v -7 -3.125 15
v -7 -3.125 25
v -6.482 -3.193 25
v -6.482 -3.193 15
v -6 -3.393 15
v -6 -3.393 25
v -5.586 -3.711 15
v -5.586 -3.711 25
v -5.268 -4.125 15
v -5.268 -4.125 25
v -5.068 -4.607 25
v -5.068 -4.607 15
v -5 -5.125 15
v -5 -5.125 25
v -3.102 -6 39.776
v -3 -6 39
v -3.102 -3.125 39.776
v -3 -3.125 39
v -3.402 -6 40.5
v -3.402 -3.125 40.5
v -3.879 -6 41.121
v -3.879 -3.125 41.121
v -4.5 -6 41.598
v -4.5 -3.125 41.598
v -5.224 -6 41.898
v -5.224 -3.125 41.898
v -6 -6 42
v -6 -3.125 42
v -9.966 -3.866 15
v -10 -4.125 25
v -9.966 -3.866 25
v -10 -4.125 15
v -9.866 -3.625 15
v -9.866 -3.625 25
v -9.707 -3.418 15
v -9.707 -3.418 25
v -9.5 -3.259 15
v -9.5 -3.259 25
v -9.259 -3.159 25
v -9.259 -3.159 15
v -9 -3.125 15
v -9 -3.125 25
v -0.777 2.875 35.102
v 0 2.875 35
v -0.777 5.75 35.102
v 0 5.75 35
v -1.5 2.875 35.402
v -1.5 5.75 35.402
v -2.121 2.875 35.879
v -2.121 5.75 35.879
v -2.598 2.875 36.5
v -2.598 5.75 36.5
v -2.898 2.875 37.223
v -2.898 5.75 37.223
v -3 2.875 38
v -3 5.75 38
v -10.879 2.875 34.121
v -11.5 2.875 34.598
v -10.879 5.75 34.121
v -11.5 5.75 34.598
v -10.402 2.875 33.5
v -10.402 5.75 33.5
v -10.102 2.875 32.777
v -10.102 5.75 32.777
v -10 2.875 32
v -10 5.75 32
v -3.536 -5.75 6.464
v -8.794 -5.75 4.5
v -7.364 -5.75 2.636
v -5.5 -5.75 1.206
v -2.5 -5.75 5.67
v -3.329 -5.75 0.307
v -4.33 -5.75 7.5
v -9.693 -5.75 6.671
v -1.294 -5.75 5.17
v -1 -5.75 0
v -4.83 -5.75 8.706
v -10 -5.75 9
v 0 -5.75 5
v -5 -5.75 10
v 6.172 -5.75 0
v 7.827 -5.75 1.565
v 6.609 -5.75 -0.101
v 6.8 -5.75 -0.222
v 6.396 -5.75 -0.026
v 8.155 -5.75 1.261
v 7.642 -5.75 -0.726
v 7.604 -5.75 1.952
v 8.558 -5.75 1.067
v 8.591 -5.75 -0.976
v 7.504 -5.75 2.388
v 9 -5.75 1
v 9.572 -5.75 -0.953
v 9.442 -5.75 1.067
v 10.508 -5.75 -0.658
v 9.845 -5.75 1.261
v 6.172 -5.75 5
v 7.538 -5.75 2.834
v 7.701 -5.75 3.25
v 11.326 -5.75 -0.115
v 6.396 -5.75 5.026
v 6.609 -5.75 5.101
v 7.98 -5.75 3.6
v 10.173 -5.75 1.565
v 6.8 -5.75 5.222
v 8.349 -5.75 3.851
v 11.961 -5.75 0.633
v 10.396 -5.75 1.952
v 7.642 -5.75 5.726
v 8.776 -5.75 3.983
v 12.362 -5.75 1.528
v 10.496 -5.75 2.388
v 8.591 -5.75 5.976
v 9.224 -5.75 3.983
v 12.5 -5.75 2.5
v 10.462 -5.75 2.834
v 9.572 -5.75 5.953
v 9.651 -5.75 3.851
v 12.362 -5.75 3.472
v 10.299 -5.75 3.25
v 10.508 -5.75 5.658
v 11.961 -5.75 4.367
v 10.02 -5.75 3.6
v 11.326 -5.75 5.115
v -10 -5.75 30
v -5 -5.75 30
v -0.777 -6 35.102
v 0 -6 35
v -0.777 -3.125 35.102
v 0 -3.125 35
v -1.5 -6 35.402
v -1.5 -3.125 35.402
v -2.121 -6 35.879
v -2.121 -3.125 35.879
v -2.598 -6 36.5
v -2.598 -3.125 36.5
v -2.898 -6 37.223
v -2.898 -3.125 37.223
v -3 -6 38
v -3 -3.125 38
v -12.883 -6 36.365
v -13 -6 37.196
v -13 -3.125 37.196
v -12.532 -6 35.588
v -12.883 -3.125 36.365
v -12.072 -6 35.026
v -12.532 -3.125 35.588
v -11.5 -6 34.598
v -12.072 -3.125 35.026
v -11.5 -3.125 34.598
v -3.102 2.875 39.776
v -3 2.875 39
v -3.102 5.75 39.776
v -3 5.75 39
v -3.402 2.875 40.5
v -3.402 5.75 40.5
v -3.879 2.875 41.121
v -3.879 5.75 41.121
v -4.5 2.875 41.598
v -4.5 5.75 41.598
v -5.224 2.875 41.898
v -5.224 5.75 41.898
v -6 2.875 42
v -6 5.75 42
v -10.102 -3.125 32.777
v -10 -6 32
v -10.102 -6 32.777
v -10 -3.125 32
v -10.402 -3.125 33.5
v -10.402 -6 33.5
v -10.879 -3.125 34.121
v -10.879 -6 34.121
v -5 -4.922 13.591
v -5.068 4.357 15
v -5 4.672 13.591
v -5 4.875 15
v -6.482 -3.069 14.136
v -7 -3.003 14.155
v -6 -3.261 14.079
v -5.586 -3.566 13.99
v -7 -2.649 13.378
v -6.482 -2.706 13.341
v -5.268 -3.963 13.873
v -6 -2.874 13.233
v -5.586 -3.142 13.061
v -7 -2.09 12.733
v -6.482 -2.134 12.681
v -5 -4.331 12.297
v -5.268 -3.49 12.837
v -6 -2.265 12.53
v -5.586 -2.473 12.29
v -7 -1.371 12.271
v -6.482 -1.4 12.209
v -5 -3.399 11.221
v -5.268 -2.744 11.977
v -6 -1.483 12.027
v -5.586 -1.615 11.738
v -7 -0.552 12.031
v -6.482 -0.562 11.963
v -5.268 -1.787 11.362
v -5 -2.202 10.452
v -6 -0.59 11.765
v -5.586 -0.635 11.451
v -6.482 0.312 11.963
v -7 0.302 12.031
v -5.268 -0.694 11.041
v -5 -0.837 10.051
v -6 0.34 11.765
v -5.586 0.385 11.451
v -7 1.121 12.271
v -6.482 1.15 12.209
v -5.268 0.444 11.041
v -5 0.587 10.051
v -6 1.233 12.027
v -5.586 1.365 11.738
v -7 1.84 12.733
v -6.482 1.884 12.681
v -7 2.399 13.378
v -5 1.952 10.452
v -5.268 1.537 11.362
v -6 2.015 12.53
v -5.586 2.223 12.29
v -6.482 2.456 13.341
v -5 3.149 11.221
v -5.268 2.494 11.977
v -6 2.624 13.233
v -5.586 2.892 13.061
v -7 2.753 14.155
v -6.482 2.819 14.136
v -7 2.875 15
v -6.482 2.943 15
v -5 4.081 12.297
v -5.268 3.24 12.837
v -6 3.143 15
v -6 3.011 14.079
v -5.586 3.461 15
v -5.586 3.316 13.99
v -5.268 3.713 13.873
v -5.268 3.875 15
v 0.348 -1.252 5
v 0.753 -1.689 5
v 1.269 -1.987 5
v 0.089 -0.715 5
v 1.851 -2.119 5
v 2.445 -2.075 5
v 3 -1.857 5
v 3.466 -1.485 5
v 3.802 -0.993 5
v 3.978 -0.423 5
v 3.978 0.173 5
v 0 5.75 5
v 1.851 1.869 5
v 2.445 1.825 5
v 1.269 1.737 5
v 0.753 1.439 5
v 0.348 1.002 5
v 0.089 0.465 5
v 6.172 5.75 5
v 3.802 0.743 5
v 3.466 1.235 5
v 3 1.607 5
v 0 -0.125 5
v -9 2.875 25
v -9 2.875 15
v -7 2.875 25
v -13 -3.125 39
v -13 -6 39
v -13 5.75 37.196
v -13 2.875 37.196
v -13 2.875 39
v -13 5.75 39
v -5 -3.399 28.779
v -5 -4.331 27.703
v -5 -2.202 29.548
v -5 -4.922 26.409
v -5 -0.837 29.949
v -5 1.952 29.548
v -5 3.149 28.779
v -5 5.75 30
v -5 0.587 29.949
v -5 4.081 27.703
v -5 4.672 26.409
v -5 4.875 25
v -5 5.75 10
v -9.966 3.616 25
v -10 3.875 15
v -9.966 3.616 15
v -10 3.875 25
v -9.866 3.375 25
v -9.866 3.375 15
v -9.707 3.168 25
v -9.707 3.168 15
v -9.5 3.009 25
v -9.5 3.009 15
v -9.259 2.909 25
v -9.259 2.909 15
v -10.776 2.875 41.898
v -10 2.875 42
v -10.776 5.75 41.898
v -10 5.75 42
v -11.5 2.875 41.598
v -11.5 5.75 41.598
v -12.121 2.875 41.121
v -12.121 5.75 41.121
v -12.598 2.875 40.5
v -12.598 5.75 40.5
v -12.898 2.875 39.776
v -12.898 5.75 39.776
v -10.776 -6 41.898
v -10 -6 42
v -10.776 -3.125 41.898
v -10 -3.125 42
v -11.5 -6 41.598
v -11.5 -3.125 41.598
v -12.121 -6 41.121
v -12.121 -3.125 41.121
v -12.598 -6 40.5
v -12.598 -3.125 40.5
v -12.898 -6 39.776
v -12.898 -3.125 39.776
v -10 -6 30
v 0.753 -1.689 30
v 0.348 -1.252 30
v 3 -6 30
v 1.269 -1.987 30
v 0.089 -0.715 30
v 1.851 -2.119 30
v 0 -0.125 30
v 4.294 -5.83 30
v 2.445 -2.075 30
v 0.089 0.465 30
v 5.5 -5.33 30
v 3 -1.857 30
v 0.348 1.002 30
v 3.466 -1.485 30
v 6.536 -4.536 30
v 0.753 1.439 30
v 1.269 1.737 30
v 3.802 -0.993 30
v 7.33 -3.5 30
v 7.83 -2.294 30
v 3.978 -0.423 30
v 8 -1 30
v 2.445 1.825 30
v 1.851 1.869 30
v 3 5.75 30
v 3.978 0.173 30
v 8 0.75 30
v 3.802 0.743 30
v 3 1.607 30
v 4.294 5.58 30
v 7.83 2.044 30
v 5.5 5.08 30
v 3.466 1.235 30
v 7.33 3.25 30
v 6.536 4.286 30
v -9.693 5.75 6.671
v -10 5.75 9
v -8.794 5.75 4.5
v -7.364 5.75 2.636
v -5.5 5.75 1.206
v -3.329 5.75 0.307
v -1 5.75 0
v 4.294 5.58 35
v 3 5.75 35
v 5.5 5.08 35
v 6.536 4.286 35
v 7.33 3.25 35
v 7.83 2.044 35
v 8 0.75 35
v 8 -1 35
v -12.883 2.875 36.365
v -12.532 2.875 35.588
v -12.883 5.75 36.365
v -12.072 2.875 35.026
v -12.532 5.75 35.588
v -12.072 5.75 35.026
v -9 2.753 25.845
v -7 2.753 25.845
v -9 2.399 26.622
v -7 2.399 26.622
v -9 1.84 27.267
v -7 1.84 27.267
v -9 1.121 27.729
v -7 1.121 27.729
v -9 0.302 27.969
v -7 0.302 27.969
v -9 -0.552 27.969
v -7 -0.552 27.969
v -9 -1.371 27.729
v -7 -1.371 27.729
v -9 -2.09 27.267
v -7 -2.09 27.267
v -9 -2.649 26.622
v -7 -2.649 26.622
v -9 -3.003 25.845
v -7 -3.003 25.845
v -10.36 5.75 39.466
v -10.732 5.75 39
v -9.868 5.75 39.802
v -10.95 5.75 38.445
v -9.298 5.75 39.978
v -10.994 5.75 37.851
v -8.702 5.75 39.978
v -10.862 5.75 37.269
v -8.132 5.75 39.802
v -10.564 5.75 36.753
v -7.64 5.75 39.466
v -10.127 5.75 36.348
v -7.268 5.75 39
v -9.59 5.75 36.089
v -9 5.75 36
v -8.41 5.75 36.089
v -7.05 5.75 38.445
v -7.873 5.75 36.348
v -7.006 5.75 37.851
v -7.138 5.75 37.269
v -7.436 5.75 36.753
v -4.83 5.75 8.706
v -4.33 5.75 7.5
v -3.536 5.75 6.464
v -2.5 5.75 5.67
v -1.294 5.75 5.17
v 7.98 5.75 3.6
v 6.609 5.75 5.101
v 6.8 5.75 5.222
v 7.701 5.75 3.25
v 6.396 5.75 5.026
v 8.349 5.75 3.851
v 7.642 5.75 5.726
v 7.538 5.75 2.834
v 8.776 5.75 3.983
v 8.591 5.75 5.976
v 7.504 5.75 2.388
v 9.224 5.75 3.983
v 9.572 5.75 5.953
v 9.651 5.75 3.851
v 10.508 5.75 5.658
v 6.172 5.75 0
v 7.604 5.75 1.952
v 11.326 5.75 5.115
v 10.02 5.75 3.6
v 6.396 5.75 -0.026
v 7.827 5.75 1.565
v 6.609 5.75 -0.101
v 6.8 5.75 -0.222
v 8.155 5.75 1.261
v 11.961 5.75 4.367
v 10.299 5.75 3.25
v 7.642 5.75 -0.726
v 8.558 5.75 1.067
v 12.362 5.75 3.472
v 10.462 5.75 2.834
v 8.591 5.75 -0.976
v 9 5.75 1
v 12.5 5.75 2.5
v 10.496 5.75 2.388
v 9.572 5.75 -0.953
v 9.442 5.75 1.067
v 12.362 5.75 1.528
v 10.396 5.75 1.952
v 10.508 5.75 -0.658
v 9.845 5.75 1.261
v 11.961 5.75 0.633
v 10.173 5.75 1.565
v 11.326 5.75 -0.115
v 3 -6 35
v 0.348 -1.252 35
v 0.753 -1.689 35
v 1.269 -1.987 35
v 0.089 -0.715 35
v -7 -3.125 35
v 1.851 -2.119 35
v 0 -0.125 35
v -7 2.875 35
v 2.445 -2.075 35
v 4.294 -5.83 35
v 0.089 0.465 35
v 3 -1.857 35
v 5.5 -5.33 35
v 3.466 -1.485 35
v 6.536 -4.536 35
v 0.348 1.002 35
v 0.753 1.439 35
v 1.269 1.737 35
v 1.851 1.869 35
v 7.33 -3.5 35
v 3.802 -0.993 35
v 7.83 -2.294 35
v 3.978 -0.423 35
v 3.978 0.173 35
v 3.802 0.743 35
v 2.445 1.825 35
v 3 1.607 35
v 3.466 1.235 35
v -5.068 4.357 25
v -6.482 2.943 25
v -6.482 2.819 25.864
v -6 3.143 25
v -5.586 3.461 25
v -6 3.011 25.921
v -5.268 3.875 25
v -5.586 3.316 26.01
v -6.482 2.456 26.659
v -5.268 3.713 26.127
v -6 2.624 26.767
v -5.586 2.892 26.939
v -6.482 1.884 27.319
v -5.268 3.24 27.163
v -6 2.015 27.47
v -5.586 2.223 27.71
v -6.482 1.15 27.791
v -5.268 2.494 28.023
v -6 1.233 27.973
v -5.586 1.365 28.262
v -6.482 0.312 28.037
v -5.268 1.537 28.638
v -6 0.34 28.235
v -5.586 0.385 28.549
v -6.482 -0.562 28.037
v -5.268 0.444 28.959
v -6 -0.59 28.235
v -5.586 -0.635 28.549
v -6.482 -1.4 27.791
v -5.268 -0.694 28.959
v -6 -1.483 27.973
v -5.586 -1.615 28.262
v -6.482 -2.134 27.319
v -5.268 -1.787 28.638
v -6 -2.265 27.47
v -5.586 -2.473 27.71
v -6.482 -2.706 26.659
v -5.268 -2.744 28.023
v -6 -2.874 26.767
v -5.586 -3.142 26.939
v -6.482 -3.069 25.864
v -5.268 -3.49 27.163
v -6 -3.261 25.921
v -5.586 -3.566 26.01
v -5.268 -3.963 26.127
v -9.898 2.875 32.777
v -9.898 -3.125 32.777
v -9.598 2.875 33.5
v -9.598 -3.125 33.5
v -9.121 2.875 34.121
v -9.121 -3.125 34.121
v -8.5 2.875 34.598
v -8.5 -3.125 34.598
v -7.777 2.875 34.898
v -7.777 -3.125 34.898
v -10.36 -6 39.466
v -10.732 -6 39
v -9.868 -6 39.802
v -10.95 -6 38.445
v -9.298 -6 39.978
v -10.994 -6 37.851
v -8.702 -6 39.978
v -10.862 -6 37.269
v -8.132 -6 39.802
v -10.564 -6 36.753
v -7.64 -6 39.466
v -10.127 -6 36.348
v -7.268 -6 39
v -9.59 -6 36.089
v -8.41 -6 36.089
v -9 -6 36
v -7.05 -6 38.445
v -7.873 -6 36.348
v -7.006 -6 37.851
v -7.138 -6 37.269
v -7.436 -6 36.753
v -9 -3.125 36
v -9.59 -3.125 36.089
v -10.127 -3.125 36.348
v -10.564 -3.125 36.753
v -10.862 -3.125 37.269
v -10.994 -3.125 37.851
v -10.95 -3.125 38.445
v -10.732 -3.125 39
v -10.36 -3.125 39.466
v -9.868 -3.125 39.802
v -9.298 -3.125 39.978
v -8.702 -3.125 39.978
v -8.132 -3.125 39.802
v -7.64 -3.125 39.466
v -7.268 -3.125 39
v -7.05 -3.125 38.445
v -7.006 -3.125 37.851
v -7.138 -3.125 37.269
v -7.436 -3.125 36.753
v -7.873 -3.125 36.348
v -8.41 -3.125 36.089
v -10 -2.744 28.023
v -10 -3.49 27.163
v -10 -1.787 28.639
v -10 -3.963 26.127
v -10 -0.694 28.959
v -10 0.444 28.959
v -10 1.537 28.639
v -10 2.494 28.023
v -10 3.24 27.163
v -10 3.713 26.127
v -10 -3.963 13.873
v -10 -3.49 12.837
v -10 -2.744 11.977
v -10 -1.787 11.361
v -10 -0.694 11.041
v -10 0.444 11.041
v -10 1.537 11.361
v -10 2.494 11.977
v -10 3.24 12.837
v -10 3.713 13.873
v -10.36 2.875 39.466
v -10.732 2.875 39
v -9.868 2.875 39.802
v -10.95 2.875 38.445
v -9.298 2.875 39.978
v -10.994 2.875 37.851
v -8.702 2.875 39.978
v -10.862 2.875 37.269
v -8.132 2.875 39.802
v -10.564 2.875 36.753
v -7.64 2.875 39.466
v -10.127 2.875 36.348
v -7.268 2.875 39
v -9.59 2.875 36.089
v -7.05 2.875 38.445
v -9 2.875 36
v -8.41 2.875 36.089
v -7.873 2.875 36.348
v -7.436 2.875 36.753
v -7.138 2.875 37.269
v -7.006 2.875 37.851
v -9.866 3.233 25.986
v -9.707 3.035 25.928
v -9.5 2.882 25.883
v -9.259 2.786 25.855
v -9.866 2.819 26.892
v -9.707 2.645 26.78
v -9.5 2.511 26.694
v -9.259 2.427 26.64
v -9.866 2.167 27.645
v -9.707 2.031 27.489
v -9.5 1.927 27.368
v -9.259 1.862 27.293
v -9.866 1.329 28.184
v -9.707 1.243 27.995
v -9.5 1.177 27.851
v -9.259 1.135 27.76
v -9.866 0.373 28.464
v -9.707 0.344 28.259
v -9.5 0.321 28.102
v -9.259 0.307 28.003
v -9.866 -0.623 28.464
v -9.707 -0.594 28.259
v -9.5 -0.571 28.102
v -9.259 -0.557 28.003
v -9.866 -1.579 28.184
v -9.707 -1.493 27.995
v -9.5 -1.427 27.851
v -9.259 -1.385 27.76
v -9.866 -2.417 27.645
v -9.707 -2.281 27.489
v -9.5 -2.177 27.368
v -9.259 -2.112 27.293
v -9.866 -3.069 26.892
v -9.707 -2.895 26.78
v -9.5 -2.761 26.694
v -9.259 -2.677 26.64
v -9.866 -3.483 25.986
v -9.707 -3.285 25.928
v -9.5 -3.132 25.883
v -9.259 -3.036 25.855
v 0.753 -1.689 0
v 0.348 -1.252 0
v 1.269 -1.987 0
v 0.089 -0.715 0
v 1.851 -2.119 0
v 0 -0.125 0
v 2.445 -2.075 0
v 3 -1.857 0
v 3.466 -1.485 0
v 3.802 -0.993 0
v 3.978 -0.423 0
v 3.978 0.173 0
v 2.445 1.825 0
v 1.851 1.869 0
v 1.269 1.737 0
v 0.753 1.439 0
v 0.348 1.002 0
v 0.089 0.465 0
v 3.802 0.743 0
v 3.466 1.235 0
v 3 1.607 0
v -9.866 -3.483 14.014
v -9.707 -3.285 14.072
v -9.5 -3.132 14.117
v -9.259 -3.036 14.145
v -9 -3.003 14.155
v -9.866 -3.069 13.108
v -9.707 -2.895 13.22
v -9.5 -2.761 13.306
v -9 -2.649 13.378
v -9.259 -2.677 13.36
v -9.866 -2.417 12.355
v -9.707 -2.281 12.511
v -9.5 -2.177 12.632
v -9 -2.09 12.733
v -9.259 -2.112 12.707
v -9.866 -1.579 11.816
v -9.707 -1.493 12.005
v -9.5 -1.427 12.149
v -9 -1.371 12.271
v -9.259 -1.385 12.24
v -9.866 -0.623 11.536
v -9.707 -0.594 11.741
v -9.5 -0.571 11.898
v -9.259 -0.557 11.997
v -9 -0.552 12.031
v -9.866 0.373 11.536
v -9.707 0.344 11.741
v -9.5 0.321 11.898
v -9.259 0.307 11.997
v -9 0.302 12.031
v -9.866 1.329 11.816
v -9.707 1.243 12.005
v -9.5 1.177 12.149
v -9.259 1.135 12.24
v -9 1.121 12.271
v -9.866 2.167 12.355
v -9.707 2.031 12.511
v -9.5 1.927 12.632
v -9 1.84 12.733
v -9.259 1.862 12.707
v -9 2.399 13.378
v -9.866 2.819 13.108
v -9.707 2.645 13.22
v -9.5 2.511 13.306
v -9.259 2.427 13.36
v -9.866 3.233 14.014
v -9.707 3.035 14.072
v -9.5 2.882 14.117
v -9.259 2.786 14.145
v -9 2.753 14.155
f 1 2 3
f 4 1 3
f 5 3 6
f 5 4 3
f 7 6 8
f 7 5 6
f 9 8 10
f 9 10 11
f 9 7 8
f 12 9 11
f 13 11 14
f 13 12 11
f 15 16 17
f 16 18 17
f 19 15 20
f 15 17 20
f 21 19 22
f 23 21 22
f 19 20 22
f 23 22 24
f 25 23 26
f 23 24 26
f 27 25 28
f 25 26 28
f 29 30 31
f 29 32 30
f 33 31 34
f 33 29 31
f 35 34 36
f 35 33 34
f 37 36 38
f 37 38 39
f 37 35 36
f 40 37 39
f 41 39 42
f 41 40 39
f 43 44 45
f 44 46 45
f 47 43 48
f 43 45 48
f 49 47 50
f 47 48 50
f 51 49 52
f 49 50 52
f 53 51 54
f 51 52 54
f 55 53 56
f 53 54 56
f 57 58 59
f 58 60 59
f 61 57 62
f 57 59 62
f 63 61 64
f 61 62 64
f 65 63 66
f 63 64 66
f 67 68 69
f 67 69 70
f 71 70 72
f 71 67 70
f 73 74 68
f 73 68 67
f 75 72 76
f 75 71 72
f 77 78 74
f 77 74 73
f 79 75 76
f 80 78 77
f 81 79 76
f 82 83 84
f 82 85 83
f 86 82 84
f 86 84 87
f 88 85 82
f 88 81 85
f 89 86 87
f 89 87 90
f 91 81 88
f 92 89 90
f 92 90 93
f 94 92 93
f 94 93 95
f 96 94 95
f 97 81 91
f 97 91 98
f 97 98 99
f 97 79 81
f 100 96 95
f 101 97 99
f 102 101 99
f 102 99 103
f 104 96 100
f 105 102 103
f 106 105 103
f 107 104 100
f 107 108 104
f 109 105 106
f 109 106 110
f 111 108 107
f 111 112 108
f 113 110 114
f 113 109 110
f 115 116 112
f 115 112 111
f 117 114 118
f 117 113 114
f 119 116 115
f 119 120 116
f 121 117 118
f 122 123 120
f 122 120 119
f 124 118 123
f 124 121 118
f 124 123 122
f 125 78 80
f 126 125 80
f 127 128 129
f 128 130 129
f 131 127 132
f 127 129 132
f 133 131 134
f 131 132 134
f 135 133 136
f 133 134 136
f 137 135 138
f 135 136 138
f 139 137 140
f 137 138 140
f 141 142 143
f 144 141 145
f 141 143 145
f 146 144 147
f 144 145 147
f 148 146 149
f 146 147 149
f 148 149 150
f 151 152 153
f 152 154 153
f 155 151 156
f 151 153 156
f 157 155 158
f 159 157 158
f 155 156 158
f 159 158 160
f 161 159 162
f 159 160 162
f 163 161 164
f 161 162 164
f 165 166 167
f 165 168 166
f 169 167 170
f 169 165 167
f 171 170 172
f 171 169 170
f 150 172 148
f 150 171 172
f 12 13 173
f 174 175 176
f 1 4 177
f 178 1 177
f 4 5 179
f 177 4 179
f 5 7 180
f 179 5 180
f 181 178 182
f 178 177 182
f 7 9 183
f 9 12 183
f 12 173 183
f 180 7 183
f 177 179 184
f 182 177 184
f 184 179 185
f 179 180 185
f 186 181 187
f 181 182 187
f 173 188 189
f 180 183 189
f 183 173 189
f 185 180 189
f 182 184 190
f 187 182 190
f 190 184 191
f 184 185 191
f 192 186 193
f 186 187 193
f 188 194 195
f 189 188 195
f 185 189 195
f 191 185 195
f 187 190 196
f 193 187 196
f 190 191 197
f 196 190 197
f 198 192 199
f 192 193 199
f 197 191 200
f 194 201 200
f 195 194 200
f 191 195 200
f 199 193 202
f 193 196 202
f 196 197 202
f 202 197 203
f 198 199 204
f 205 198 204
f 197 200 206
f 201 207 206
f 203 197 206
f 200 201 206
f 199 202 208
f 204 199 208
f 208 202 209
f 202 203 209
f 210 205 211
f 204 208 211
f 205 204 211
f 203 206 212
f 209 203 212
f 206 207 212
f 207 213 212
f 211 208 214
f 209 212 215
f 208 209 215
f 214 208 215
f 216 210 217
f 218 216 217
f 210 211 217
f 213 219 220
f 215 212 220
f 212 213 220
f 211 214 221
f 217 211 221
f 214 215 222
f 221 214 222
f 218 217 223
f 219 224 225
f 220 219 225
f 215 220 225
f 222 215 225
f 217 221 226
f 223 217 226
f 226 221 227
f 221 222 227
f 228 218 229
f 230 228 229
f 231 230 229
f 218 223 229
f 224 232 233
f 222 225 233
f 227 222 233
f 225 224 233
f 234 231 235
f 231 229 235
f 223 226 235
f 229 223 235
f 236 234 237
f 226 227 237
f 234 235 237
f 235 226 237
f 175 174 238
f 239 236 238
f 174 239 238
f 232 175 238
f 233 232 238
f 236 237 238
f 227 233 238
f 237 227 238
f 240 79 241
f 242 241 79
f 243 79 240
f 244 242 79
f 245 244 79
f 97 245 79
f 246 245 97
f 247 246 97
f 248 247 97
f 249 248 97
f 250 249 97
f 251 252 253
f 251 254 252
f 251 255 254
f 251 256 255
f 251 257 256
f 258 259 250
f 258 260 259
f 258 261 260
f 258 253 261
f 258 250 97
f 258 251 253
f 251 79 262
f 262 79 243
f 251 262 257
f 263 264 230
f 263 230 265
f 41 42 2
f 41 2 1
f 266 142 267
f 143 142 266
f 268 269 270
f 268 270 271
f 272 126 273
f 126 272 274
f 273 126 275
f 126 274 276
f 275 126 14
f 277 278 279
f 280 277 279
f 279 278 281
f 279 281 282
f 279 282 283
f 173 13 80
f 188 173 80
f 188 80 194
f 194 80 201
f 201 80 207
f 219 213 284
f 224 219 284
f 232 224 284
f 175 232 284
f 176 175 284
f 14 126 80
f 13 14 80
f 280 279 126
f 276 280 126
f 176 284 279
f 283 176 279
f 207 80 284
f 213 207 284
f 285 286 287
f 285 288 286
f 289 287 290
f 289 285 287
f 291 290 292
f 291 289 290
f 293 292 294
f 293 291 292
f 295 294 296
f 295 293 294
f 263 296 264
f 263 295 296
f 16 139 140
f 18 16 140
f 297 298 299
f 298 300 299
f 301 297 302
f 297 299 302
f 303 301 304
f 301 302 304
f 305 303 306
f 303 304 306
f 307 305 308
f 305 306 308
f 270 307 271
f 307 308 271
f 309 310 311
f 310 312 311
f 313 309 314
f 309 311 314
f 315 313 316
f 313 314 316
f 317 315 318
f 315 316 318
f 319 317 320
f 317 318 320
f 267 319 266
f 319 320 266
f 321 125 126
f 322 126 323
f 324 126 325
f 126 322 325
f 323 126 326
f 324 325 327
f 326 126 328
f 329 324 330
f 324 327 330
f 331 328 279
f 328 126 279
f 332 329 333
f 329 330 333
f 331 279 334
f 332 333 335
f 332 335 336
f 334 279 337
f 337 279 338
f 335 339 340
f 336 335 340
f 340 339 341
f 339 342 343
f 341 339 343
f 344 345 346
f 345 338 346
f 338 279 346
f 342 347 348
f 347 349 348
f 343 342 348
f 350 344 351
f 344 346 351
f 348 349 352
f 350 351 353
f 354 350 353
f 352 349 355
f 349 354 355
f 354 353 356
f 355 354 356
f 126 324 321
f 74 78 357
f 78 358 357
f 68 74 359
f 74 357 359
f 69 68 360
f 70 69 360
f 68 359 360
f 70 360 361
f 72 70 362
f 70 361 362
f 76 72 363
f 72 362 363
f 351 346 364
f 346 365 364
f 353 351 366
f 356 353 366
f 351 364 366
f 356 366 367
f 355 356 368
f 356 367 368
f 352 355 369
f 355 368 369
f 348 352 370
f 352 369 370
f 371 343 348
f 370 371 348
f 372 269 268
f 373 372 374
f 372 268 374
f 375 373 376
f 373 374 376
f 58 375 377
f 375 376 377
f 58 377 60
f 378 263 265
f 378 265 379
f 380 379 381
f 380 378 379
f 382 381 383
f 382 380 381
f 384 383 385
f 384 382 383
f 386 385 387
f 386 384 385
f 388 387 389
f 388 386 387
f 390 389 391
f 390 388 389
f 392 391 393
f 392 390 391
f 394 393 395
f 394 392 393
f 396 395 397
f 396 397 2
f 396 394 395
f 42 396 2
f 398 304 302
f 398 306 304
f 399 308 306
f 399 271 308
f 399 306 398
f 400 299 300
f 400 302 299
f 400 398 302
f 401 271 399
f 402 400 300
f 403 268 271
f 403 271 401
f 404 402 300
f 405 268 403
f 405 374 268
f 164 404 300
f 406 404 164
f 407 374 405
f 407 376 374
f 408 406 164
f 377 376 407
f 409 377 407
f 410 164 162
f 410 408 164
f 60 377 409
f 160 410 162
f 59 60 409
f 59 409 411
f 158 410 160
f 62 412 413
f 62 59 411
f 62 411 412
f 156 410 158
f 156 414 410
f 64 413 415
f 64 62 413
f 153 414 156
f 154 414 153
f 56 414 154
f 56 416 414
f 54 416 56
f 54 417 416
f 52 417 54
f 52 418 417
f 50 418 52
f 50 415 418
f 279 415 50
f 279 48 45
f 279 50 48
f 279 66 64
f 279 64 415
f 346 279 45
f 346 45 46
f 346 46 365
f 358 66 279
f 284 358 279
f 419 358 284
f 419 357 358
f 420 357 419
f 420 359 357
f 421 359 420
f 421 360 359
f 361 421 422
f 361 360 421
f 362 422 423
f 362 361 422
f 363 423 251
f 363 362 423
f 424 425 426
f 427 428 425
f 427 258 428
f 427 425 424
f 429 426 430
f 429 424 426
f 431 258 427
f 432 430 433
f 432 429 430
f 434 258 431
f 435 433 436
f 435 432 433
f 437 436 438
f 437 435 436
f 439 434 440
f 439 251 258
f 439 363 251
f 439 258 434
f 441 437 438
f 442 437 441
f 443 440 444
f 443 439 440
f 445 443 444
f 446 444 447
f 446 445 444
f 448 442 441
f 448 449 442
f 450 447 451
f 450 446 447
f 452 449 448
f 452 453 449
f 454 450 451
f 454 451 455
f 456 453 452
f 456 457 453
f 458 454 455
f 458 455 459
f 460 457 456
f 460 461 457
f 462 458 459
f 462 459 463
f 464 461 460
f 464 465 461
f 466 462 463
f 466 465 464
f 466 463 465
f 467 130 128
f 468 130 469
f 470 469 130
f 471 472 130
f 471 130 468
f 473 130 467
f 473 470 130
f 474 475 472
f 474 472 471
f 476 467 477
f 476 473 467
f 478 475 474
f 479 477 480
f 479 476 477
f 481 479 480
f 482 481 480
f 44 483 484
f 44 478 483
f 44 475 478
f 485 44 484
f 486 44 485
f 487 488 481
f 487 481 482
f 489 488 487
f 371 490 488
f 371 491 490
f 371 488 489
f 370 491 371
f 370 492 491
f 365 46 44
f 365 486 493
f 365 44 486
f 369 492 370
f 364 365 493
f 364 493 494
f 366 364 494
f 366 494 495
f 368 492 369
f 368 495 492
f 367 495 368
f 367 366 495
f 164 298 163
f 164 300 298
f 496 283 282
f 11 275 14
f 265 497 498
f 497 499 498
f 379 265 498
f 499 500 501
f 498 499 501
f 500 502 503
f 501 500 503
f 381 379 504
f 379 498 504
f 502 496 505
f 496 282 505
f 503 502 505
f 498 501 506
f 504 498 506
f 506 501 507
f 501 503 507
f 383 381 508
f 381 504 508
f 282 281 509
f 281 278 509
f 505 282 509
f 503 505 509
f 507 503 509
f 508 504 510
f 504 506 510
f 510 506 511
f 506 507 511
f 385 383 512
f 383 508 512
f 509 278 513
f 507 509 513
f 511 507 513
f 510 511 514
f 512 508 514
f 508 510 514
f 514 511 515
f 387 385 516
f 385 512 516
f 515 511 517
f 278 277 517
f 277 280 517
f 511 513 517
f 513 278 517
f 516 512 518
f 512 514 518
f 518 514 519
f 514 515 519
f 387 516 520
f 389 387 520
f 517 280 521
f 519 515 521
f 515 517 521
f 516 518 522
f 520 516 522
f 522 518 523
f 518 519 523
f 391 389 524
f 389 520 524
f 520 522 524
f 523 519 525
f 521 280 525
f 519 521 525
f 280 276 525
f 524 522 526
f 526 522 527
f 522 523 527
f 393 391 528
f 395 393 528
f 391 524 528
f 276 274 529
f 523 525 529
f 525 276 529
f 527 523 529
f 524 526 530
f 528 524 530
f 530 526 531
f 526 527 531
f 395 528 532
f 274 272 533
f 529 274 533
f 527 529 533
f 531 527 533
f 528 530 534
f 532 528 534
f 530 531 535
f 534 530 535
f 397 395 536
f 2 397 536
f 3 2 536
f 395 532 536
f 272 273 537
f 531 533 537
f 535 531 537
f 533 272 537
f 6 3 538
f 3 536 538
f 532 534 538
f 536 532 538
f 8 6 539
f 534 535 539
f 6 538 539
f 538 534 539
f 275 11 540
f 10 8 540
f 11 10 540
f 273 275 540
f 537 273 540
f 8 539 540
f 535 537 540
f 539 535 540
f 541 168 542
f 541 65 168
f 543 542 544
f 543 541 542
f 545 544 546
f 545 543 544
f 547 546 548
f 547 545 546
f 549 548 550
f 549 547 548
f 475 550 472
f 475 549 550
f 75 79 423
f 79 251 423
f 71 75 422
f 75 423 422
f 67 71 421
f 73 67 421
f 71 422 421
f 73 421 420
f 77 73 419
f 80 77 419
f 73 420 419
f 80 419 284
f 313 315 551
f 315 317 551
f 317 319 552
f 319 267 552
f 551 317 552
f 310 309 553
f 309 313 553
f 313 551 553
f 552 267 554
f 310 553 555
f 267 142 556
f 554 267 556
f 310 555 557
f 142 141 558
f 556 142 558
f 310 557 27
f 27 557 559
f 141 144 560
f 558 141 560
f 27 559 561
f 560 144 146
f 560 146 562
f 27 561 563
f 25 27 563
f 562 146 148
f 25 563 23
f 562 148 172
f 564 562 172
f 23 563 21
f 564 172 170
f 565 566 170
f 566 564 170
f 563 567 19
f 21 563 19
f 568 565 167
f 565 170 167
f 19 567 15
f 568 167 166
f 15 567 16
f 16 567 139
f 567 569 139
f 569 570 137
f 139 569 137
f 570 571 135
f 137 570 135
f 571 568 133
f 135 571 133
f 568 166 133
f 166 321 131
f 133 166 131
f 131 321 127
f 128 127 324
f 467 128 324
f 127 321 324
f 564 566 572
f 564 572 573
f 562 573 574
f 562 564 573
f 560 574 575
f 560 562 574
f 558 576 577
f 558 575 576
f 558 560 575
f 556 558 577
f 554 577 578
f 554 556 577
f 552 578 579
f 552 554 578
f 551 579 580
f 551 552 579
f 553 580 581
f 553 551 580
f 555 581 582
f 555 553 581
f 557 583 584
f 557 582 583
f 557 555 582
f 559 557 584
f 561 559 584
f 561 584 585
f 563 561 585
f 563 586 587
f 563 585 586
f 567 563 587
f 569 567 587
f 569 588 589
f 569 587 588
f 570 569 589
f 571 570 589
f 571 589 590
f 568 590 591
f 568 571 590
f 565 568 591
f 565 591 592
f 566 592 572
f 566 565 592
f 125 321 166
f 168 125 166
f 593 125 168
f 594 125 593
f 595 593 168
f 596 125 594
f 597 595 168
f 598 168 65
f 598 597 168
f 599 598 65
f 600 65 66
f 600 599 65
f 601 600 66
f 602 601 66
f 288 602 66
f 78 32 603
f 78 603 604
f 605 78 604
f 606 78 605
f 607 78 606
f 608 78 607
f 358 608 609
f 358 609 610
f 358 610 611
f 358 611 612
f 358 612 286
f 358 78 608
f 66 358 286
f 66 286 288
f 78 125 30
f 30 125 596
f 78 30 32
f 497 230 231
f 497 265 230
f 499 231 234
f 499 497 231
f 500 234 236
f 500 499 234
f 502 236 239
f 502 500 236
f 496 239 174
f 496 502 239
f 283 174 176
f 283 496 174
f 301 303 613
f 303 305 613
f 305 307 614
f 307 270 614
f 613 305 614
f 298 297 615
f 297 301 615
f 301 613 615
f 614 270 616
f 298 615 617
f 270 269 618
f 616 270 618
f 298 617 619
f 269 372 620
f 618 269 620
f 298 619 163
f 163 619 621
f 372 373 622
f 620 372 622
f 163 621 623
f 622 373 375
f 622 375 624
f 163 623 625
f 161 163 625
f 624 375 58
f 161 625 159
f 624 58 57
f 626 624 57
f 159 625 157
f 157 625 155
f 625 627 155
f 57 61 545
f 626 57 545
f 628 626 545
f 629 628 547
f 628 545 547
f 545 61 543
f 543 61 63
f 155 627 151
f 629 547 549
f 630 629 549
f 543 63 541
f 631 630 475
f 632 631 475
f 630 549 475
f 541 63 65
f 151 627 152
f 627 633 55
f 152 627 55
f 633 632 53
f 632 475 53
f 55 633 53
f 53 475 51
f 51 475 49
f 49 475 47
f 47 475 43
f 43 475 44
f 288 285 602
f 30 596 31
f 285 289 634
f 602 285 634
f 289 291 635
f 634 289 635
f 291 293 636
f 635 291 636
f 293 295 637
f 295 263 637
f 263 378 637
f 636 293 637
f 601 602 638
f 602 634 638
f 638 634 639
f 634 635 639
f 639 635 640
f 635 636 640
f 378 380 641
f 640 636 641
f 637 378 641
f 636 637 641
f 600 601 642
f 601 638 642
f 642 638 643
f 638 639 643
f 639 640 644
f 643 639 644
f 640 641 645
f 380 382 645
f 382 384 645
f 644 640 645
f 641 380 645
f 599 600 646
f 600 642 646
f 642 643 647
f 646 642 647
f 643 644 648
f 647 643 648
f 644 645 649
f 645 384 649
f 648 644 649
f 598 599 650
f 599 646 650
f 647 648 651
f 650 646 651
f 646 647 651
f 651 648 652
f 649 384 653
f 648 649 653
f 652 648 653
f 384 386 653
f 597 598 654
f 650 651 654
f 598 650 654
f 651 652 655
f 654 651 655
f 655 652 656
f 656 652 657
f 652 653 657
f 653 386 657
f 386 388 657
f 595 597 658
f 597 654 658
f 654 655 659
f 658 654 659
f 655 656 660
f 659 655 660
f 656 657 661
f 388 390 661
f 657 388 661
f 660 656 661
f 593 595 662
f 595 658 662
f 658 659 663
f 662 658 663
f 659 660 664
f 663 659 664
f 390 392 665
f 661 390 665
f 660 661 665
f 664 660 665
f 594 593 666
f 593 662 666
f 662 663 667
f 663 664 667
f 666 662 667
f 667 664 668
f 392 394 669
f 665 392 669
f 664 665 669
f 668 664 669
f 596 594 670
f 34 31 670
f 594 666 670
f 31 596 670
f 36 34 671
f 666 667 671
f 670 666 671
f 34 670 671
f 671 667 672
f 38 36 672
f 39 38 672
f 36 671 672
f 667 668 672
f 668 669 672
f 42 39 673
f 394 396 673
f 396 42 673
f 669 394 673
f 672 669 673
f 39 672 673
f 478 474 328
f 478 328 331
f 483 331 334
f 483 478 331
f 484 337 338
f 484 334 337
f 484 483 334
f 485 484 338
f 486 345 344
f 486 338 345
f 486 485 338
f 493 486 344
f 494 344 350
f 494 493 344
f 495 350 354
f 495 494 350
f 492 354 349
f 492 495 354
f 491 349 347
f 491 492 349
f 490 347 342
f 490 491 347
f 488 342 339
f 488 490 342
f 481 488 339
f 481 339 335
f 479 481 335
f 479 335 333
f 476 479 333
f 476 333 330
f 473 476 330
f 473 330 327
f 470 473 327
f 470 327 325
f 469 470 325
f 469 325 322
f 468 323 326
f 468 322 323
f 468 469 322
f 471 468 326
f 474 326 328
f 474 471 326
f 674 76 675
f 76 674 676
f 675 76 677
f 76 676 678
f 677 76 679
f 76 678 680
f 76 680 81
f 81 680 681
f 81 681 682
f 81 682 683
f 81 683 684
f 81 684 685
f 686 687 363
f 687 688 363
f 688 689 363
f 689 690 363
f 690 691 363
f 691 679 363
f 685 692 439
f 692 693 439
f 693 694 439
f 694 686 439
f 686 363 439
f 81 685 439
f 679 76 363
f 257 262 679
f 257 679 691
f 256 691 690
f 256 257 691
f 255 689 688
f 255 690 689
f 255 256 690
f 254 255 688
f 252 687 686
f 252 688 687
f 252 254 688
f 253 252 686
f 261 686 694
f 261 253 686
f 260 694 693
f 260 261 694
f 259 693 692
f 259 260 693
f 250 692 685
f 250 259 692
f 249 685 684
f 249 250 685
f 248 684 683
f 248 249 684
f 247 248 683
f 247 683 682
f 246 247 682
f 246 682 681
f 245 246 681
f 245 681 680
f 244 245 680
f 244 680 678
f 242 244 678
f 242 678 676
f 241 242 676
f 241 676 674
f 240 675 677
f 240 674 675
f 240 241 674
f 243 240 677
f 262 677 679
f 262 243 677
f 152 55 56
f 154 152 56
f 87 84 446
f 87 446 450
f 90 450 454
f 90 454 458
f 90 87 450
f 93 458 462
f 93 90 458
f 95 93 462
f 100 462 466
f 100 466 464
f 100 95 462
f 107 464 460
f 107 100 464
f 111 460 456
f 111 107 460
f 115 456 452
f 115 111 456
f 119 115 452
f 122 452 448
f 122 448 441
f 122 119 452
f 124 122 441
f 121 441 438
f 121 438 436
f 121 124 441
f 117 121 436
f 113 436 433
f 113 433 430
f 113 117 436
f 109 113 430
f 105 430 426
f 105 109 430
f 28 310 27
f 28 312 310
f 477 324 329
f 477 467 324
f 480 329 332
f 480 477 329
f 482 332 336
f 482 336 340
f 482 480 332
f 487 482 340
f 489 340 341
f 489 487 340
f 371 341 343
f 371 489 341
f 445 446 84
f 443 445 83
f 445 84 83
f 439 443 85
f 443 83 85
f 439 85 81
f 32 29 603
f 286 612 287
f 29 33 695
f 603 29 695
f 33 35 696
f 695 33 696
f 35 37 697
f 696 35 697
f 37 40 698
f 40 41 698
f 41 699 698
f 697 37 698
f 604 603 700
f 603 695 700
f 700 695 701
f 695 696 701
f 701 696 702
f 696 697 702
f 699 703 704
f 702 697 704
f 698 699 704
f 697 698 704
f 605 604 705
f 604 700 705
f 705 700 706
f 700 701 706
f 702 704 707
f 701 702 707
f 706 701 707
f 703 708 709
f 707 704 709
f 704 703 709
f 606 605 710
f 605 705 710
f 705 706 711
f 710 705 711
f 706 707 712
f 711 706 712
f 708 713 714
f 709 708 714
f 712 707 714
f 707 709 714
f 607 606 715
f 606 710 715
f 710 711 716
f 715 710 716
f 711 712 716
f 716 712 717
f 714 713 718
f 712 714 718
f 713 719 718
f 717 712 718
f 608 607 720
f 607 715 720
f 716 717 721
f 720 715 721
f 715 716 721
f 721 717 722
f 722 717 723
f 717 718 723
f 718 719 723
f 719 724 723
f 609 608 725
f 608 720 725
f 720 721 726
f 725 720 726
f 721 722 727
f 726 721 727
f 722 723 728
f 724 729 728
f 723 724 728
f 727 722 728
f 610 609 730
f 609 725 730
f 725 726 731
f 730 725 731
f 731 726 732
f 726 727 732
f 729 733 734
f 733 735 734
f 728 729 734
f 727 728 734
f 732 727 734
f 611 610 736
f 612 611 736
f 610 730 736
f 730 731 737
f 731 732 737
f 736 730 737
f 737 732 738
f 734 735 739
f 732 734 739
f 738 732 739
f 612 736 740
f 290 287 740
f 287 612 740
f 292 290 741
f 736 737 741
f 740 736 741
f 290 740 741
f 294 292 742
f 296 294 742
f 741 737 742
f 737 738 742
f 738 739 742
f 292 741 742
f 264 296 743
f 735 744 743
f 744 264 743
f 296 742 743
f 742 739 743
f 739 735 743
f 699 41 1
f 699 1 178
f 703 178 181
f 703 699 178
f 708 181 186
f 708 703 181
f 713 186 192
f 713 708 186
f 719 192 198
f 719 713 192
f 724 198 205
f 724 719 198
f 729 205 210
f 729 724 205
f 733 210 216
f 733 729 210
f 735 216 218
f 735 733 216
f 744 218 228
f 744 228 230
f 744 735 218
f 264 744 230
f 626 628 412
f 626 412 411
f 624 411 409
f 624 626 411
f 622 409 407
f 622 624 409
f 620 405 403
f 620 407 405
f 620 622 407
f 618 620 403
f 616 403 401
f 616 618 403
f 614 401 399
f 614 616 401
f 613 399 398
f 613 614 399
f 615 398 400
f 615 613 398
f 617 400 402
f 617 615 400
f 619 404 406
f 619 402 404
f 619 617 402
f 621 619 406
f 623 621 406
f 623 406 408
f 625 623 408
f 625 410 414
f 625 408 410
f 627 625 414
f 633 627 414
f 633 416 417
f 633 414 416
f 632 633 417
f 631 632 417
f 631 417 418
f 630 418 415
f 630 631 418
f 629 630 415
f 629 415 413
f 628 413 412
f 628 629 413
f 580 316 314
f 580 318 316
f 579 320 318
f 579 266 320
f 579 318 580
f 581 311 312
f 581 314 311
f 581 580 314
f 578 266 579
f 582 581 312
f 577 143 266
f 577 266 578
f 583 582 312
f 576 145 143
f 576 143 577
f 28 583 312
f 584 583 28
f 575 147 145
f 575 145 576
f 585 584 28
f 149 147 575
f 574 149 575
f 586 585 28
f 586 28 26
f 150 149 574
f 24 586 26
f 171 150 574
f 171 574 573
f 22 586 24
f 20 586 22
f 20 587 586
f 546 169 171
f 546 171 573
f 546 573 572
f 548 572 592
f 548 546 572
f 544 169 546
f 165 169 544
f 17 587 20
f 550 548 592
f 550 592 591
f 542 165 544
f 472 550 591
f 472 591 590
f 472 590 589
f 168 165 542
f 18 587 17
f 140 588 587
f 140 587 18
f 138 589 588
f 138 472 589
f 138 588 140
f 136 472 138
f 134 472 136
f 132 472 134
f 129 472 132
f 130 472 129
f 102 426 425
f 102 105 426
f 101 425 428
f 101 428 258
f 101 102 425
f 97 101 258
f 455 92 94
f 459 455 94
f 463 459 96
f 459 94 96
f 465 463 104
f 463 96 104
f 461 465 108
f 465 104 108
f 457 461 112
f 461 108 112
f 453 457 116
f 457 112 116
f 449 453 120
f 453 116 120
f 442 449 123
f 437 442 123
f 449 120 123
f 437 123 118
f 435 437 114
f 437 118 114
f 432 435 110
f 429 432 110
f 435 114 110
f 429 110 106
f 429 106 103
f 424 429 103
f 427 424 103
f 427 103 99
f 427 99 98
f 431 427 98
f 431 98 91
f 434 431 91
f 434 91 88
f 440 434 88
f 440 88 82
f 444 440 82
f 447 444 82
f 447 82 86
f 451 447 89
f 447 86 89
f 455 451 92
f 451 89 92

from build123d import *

# Parameters (mm, degrees)
SKETCH1_W               = 20
SKETCH1_H               = 11.5
BOSS_EXTRUDE1_DEPTH     = 5
SKETCH2_W               = 5
SKETCH2_H               = 11.5
BOSS_EXTRUDE2_DEPTH     = 25
SKETCH3_W               = 18
SKETCH3_H               = 11.75
BOSS_EXTRUDE3_DEPTH     = 5
CUT_EXTRUDE1_DEPTH      = 5
CUT_EXTRUDE2_DEPTH      = 33.186953879
CUT_EXTRUDE2_DEPTH_BACK = 33.186953879
SKETCH5_R               = 2
FILLET1_R               = 9
FILLET7_R               = 5
FILLET8_R               = 1
FILLET9_R               = 2
CUT_EXTRUDE4_DEPTH      = 39.173943993
CUT_EXTRUDE4_DEPTH_BACK = 39.173943993
SKETCH10_R              = 1.5
SKETCH10_4_R            = 3.5
SKETCH10_4_R_2          = 1.5
BOSS_EXTRUDE7_DEPTH     = 11.5
FILLET13_R              = 1
FILLET16_R              = 5
SKETCH11_W              = 10
SKETCH11_H              = 2.875
BOSS_EXTRUDE8_DEPTH     = 7
CUT_EXTRUDE5_DEPTH      = 46.508927696
CUT_EXTRUDE5_DEPTH_BACK = 46.508927696
SKETCH12_R              = 2
FILLET17_R              = 3
FILLET18_R              = 3
FILLET19_R              = 3


with BuildPart() as part:
    # Sketch1 → Boss-Extrude1 (new body)
    with BuildSketch(Plane.XY):
        Rectangle(SKETCH1_W, SKETCH1_H)
    extrude(amount=BOSS_EXTRUDE1_DEPTH)

    # Sketch2 → Boss-Extrude2 (add)
    with BuildSketch(Plane.XY.offset(5)):
        with Locations((-7.5, 0)):
            Rectangle(SKETCH2_W, SKETCH2_H)
    extrude(amount=BOSS_EXTRUDE2_DEPTH)

    # Sketch3 → Boss-Extrude3 (add)
    with BuildSketch(Plane.XY.offset(30)):
        with Locations((-1, -0.125)):
            Rectangle(SKETCH3_W, SKETCH3_H)
    extrude(amount=BOSS_EXTRUDE3_DEPTH)

    # Sketch4 → Cut-Extrude1 (cut)
    with BuildSketch(Plane.ZY.offset(10)):
        with BuildLine():
            Line((15, 2.875), (25, 2.875))
            ThreePointArc((25, 2.875), (28, -0.125), (25, -3.125))
            Line((25, -3.125), (15, -3.125))
            ThreePointArc((15, -3.125), (12, -0.125), (15, 2.875))
        make_face()
    extrude(amount=-CUT_EXTRUDE1_DEPTH, mode=Mode.SUBTRACT)

    # Sketch5 → Cut-Extrude2 (cut, two sides: drawn at the far end of the back side and taken through both)
    with BuildSketch(Plane(origin=(0, 0, 30), x_dir=(-1, 0, 0), z_dir=(0, 0, -1)).offset(-CUT_EXTRUDE2_DEPTH_BACK)):
        with Locations((-2, -0.125)):
            Circle(SKETCH5_R)
    extrude(amount=CUT_EXTRUDE2_DEPTH + CUT_EXTRUDE2_DEPTH_BACK, mode=Mode.SUBTRACT)

    # Fillet1
    fillet1_edges = [part.edges().sort_by_distance(p)[0] for p in [
        (-10, 0, 0),
    ]]
    fillet(fillet1_edges, radius=FILLET1_R)

    # Fillet7
    fillet7_edges = [part.edges().sort_by_distance(p)[0] for p in [
        (8, -6, 32.5),
        (8, 5.75, 32.5),
    ]]
    fillet(fillet7_edges, radius=FILLET7_R)

    # Fillet8
    fillet8_edges = [part.edges().sort_by_distance(p)[0] for p in [
        (-10, -0.125, 12),
        (-10, -3.125, 20),
        (-10, -0.125, 28),
        (-10, 2.875, 20),
    ]]
    fillet(fillet8_edges, radius=FILLET8_R)

    # Fillet9
    fillet9_edges = [part.edges().sort_by_distance(p)[0] for p in [
        (-5, -0.125, 12),
        (-5, 2.875, 20),
        (-5, -0.125, 28),
        (-5, -3.125, 20),
    ]]
    fillet(fillet9_edges, radius=FILLET9_R - 0.0001)  # a hair under: the kernel refuses the full size

    # Sketch10 → Cut-Extrude4 (cut, two sides: drawn at the far end of the back side and taken through both)
    with BuildSketch(Plane.XZ.offset(5.75).offset(-CUT_EXTRUDE4_DEPTH_BACK)):
        with Locations((9, 2.5)):
            Circle(SKETCH10_R)
    extrude(amount=CUT_EXTRUDE4_DEPTH + CUT_EXTRUDE4_DEPTH_BACK, mode=Mode.SUBTRACT)

    # Sketch10<4> → Boss-Extrude7 (add)
    with BuildSketch(Plane.XZ.offset(5.75)):
        with Locations((9, 2.5)):
            Circle(SKETCH10_4_R)
        with Locations(Location((9, 2.5, 0), (0, 0, 270))):
            Circle(SKETCH10_4_R_2, mode=Mode.SUBTRACT)
    extrude(amount=-BOSS_EXTRUDE7_DEPTH)

    # Fillet13
    fillet13_edges = [part.edges().sort_by_distance(p)[0] for p in [
        (6.550510257, 0, 0),
        (6.550510257, 0, 5),
    ]]
    fillet(fillet13_edges, radius=FILLET13_R)

    # Fillet16
    fillet16_edges = [part.edges().sort_by_distance(p)[0] for p in [
        (-5, 0, 5),
    ]]
    fillet(fillet16_edges, radius=FILLET16_R - 0.0001)  # a hair under: the kernel refuses the full size

    # Sketch11 → Boss-Extrude8 (add)
    with BuildSketch(Plane.XY.offset(35)):
        with Locations((-8, 4.3125)):
            Rectangle(SKETCH11_W, SKETCH11_H)
        with Locations((-8, -4.5625)):
            Rectangle(SKETCH11_W, SKETCH11_H)
    extrude(amount=BOSS_EXTRUDE8_DEPTH)

    # Sketch12 → Cut-Extrude5 (cut, two sides: drawn at the far end of the back side and taken through both)
    with BuildSketch(Plane(origin=(0, 5.75, 0), x_dir=(1, 0, 0), z_dir=(0, 1, 0)).offset(-CUT_EXTRUDE5_DEPTH_BACK)):
        with Locations(Location((-9, -38, 0), (0, 0, 90))):
            Circle(SKETCH12_R)
    extrude(amount=CUT_EXTRUDE5_DEPTH + CUT_EXTRUDE5_DEPTH_BACK, mode=Mode.SUBTRACT)

    # Fillet17
    fillet17_edges = [part.edges().sort_by_distance(p)[0] for p in [
        (-10, -4.5625, 35),
        (-3, 4.3125, 35),
        (-3, -4.5625, 35),
        (-10, 4.3125, 35),
    ]]
    fillet(fillet17_edges, radius=FILLET17_R - 0.0001)  # a hair under: the kernel refuses the full size
    fillet17_2_edges = [part.edges().sort_by_distance(p)[0] for p in [
        (-13, 4.3125, 42),
        (-3, 4.3125, 42),
        (-3, -4.5625, 42),
        (-13, -4.5625, 42),
    ]]
    fillet(fillet17_2_edges, radius=FILLET17_R)

    # Fillet18
    fillet18_edges = [part.edges().sort_by_distance(p)[0] for p in [
        (-13, 4.3125, 35),
        (-13, -4.5625, 35),
    ]]
    fillet(fillet18_edges, radius=FILLET18_R)

    # Fillet19
    fillet19_edges = [part.edges().sort_by_distance(p)[0] for p in [
        (-10, -0.125, 35),
    ]]
    fillet(fillet19_edges, radius=FILLET19_R - 0.0001)  # a hair under: the kernel refuses the full size


solid = part.part
